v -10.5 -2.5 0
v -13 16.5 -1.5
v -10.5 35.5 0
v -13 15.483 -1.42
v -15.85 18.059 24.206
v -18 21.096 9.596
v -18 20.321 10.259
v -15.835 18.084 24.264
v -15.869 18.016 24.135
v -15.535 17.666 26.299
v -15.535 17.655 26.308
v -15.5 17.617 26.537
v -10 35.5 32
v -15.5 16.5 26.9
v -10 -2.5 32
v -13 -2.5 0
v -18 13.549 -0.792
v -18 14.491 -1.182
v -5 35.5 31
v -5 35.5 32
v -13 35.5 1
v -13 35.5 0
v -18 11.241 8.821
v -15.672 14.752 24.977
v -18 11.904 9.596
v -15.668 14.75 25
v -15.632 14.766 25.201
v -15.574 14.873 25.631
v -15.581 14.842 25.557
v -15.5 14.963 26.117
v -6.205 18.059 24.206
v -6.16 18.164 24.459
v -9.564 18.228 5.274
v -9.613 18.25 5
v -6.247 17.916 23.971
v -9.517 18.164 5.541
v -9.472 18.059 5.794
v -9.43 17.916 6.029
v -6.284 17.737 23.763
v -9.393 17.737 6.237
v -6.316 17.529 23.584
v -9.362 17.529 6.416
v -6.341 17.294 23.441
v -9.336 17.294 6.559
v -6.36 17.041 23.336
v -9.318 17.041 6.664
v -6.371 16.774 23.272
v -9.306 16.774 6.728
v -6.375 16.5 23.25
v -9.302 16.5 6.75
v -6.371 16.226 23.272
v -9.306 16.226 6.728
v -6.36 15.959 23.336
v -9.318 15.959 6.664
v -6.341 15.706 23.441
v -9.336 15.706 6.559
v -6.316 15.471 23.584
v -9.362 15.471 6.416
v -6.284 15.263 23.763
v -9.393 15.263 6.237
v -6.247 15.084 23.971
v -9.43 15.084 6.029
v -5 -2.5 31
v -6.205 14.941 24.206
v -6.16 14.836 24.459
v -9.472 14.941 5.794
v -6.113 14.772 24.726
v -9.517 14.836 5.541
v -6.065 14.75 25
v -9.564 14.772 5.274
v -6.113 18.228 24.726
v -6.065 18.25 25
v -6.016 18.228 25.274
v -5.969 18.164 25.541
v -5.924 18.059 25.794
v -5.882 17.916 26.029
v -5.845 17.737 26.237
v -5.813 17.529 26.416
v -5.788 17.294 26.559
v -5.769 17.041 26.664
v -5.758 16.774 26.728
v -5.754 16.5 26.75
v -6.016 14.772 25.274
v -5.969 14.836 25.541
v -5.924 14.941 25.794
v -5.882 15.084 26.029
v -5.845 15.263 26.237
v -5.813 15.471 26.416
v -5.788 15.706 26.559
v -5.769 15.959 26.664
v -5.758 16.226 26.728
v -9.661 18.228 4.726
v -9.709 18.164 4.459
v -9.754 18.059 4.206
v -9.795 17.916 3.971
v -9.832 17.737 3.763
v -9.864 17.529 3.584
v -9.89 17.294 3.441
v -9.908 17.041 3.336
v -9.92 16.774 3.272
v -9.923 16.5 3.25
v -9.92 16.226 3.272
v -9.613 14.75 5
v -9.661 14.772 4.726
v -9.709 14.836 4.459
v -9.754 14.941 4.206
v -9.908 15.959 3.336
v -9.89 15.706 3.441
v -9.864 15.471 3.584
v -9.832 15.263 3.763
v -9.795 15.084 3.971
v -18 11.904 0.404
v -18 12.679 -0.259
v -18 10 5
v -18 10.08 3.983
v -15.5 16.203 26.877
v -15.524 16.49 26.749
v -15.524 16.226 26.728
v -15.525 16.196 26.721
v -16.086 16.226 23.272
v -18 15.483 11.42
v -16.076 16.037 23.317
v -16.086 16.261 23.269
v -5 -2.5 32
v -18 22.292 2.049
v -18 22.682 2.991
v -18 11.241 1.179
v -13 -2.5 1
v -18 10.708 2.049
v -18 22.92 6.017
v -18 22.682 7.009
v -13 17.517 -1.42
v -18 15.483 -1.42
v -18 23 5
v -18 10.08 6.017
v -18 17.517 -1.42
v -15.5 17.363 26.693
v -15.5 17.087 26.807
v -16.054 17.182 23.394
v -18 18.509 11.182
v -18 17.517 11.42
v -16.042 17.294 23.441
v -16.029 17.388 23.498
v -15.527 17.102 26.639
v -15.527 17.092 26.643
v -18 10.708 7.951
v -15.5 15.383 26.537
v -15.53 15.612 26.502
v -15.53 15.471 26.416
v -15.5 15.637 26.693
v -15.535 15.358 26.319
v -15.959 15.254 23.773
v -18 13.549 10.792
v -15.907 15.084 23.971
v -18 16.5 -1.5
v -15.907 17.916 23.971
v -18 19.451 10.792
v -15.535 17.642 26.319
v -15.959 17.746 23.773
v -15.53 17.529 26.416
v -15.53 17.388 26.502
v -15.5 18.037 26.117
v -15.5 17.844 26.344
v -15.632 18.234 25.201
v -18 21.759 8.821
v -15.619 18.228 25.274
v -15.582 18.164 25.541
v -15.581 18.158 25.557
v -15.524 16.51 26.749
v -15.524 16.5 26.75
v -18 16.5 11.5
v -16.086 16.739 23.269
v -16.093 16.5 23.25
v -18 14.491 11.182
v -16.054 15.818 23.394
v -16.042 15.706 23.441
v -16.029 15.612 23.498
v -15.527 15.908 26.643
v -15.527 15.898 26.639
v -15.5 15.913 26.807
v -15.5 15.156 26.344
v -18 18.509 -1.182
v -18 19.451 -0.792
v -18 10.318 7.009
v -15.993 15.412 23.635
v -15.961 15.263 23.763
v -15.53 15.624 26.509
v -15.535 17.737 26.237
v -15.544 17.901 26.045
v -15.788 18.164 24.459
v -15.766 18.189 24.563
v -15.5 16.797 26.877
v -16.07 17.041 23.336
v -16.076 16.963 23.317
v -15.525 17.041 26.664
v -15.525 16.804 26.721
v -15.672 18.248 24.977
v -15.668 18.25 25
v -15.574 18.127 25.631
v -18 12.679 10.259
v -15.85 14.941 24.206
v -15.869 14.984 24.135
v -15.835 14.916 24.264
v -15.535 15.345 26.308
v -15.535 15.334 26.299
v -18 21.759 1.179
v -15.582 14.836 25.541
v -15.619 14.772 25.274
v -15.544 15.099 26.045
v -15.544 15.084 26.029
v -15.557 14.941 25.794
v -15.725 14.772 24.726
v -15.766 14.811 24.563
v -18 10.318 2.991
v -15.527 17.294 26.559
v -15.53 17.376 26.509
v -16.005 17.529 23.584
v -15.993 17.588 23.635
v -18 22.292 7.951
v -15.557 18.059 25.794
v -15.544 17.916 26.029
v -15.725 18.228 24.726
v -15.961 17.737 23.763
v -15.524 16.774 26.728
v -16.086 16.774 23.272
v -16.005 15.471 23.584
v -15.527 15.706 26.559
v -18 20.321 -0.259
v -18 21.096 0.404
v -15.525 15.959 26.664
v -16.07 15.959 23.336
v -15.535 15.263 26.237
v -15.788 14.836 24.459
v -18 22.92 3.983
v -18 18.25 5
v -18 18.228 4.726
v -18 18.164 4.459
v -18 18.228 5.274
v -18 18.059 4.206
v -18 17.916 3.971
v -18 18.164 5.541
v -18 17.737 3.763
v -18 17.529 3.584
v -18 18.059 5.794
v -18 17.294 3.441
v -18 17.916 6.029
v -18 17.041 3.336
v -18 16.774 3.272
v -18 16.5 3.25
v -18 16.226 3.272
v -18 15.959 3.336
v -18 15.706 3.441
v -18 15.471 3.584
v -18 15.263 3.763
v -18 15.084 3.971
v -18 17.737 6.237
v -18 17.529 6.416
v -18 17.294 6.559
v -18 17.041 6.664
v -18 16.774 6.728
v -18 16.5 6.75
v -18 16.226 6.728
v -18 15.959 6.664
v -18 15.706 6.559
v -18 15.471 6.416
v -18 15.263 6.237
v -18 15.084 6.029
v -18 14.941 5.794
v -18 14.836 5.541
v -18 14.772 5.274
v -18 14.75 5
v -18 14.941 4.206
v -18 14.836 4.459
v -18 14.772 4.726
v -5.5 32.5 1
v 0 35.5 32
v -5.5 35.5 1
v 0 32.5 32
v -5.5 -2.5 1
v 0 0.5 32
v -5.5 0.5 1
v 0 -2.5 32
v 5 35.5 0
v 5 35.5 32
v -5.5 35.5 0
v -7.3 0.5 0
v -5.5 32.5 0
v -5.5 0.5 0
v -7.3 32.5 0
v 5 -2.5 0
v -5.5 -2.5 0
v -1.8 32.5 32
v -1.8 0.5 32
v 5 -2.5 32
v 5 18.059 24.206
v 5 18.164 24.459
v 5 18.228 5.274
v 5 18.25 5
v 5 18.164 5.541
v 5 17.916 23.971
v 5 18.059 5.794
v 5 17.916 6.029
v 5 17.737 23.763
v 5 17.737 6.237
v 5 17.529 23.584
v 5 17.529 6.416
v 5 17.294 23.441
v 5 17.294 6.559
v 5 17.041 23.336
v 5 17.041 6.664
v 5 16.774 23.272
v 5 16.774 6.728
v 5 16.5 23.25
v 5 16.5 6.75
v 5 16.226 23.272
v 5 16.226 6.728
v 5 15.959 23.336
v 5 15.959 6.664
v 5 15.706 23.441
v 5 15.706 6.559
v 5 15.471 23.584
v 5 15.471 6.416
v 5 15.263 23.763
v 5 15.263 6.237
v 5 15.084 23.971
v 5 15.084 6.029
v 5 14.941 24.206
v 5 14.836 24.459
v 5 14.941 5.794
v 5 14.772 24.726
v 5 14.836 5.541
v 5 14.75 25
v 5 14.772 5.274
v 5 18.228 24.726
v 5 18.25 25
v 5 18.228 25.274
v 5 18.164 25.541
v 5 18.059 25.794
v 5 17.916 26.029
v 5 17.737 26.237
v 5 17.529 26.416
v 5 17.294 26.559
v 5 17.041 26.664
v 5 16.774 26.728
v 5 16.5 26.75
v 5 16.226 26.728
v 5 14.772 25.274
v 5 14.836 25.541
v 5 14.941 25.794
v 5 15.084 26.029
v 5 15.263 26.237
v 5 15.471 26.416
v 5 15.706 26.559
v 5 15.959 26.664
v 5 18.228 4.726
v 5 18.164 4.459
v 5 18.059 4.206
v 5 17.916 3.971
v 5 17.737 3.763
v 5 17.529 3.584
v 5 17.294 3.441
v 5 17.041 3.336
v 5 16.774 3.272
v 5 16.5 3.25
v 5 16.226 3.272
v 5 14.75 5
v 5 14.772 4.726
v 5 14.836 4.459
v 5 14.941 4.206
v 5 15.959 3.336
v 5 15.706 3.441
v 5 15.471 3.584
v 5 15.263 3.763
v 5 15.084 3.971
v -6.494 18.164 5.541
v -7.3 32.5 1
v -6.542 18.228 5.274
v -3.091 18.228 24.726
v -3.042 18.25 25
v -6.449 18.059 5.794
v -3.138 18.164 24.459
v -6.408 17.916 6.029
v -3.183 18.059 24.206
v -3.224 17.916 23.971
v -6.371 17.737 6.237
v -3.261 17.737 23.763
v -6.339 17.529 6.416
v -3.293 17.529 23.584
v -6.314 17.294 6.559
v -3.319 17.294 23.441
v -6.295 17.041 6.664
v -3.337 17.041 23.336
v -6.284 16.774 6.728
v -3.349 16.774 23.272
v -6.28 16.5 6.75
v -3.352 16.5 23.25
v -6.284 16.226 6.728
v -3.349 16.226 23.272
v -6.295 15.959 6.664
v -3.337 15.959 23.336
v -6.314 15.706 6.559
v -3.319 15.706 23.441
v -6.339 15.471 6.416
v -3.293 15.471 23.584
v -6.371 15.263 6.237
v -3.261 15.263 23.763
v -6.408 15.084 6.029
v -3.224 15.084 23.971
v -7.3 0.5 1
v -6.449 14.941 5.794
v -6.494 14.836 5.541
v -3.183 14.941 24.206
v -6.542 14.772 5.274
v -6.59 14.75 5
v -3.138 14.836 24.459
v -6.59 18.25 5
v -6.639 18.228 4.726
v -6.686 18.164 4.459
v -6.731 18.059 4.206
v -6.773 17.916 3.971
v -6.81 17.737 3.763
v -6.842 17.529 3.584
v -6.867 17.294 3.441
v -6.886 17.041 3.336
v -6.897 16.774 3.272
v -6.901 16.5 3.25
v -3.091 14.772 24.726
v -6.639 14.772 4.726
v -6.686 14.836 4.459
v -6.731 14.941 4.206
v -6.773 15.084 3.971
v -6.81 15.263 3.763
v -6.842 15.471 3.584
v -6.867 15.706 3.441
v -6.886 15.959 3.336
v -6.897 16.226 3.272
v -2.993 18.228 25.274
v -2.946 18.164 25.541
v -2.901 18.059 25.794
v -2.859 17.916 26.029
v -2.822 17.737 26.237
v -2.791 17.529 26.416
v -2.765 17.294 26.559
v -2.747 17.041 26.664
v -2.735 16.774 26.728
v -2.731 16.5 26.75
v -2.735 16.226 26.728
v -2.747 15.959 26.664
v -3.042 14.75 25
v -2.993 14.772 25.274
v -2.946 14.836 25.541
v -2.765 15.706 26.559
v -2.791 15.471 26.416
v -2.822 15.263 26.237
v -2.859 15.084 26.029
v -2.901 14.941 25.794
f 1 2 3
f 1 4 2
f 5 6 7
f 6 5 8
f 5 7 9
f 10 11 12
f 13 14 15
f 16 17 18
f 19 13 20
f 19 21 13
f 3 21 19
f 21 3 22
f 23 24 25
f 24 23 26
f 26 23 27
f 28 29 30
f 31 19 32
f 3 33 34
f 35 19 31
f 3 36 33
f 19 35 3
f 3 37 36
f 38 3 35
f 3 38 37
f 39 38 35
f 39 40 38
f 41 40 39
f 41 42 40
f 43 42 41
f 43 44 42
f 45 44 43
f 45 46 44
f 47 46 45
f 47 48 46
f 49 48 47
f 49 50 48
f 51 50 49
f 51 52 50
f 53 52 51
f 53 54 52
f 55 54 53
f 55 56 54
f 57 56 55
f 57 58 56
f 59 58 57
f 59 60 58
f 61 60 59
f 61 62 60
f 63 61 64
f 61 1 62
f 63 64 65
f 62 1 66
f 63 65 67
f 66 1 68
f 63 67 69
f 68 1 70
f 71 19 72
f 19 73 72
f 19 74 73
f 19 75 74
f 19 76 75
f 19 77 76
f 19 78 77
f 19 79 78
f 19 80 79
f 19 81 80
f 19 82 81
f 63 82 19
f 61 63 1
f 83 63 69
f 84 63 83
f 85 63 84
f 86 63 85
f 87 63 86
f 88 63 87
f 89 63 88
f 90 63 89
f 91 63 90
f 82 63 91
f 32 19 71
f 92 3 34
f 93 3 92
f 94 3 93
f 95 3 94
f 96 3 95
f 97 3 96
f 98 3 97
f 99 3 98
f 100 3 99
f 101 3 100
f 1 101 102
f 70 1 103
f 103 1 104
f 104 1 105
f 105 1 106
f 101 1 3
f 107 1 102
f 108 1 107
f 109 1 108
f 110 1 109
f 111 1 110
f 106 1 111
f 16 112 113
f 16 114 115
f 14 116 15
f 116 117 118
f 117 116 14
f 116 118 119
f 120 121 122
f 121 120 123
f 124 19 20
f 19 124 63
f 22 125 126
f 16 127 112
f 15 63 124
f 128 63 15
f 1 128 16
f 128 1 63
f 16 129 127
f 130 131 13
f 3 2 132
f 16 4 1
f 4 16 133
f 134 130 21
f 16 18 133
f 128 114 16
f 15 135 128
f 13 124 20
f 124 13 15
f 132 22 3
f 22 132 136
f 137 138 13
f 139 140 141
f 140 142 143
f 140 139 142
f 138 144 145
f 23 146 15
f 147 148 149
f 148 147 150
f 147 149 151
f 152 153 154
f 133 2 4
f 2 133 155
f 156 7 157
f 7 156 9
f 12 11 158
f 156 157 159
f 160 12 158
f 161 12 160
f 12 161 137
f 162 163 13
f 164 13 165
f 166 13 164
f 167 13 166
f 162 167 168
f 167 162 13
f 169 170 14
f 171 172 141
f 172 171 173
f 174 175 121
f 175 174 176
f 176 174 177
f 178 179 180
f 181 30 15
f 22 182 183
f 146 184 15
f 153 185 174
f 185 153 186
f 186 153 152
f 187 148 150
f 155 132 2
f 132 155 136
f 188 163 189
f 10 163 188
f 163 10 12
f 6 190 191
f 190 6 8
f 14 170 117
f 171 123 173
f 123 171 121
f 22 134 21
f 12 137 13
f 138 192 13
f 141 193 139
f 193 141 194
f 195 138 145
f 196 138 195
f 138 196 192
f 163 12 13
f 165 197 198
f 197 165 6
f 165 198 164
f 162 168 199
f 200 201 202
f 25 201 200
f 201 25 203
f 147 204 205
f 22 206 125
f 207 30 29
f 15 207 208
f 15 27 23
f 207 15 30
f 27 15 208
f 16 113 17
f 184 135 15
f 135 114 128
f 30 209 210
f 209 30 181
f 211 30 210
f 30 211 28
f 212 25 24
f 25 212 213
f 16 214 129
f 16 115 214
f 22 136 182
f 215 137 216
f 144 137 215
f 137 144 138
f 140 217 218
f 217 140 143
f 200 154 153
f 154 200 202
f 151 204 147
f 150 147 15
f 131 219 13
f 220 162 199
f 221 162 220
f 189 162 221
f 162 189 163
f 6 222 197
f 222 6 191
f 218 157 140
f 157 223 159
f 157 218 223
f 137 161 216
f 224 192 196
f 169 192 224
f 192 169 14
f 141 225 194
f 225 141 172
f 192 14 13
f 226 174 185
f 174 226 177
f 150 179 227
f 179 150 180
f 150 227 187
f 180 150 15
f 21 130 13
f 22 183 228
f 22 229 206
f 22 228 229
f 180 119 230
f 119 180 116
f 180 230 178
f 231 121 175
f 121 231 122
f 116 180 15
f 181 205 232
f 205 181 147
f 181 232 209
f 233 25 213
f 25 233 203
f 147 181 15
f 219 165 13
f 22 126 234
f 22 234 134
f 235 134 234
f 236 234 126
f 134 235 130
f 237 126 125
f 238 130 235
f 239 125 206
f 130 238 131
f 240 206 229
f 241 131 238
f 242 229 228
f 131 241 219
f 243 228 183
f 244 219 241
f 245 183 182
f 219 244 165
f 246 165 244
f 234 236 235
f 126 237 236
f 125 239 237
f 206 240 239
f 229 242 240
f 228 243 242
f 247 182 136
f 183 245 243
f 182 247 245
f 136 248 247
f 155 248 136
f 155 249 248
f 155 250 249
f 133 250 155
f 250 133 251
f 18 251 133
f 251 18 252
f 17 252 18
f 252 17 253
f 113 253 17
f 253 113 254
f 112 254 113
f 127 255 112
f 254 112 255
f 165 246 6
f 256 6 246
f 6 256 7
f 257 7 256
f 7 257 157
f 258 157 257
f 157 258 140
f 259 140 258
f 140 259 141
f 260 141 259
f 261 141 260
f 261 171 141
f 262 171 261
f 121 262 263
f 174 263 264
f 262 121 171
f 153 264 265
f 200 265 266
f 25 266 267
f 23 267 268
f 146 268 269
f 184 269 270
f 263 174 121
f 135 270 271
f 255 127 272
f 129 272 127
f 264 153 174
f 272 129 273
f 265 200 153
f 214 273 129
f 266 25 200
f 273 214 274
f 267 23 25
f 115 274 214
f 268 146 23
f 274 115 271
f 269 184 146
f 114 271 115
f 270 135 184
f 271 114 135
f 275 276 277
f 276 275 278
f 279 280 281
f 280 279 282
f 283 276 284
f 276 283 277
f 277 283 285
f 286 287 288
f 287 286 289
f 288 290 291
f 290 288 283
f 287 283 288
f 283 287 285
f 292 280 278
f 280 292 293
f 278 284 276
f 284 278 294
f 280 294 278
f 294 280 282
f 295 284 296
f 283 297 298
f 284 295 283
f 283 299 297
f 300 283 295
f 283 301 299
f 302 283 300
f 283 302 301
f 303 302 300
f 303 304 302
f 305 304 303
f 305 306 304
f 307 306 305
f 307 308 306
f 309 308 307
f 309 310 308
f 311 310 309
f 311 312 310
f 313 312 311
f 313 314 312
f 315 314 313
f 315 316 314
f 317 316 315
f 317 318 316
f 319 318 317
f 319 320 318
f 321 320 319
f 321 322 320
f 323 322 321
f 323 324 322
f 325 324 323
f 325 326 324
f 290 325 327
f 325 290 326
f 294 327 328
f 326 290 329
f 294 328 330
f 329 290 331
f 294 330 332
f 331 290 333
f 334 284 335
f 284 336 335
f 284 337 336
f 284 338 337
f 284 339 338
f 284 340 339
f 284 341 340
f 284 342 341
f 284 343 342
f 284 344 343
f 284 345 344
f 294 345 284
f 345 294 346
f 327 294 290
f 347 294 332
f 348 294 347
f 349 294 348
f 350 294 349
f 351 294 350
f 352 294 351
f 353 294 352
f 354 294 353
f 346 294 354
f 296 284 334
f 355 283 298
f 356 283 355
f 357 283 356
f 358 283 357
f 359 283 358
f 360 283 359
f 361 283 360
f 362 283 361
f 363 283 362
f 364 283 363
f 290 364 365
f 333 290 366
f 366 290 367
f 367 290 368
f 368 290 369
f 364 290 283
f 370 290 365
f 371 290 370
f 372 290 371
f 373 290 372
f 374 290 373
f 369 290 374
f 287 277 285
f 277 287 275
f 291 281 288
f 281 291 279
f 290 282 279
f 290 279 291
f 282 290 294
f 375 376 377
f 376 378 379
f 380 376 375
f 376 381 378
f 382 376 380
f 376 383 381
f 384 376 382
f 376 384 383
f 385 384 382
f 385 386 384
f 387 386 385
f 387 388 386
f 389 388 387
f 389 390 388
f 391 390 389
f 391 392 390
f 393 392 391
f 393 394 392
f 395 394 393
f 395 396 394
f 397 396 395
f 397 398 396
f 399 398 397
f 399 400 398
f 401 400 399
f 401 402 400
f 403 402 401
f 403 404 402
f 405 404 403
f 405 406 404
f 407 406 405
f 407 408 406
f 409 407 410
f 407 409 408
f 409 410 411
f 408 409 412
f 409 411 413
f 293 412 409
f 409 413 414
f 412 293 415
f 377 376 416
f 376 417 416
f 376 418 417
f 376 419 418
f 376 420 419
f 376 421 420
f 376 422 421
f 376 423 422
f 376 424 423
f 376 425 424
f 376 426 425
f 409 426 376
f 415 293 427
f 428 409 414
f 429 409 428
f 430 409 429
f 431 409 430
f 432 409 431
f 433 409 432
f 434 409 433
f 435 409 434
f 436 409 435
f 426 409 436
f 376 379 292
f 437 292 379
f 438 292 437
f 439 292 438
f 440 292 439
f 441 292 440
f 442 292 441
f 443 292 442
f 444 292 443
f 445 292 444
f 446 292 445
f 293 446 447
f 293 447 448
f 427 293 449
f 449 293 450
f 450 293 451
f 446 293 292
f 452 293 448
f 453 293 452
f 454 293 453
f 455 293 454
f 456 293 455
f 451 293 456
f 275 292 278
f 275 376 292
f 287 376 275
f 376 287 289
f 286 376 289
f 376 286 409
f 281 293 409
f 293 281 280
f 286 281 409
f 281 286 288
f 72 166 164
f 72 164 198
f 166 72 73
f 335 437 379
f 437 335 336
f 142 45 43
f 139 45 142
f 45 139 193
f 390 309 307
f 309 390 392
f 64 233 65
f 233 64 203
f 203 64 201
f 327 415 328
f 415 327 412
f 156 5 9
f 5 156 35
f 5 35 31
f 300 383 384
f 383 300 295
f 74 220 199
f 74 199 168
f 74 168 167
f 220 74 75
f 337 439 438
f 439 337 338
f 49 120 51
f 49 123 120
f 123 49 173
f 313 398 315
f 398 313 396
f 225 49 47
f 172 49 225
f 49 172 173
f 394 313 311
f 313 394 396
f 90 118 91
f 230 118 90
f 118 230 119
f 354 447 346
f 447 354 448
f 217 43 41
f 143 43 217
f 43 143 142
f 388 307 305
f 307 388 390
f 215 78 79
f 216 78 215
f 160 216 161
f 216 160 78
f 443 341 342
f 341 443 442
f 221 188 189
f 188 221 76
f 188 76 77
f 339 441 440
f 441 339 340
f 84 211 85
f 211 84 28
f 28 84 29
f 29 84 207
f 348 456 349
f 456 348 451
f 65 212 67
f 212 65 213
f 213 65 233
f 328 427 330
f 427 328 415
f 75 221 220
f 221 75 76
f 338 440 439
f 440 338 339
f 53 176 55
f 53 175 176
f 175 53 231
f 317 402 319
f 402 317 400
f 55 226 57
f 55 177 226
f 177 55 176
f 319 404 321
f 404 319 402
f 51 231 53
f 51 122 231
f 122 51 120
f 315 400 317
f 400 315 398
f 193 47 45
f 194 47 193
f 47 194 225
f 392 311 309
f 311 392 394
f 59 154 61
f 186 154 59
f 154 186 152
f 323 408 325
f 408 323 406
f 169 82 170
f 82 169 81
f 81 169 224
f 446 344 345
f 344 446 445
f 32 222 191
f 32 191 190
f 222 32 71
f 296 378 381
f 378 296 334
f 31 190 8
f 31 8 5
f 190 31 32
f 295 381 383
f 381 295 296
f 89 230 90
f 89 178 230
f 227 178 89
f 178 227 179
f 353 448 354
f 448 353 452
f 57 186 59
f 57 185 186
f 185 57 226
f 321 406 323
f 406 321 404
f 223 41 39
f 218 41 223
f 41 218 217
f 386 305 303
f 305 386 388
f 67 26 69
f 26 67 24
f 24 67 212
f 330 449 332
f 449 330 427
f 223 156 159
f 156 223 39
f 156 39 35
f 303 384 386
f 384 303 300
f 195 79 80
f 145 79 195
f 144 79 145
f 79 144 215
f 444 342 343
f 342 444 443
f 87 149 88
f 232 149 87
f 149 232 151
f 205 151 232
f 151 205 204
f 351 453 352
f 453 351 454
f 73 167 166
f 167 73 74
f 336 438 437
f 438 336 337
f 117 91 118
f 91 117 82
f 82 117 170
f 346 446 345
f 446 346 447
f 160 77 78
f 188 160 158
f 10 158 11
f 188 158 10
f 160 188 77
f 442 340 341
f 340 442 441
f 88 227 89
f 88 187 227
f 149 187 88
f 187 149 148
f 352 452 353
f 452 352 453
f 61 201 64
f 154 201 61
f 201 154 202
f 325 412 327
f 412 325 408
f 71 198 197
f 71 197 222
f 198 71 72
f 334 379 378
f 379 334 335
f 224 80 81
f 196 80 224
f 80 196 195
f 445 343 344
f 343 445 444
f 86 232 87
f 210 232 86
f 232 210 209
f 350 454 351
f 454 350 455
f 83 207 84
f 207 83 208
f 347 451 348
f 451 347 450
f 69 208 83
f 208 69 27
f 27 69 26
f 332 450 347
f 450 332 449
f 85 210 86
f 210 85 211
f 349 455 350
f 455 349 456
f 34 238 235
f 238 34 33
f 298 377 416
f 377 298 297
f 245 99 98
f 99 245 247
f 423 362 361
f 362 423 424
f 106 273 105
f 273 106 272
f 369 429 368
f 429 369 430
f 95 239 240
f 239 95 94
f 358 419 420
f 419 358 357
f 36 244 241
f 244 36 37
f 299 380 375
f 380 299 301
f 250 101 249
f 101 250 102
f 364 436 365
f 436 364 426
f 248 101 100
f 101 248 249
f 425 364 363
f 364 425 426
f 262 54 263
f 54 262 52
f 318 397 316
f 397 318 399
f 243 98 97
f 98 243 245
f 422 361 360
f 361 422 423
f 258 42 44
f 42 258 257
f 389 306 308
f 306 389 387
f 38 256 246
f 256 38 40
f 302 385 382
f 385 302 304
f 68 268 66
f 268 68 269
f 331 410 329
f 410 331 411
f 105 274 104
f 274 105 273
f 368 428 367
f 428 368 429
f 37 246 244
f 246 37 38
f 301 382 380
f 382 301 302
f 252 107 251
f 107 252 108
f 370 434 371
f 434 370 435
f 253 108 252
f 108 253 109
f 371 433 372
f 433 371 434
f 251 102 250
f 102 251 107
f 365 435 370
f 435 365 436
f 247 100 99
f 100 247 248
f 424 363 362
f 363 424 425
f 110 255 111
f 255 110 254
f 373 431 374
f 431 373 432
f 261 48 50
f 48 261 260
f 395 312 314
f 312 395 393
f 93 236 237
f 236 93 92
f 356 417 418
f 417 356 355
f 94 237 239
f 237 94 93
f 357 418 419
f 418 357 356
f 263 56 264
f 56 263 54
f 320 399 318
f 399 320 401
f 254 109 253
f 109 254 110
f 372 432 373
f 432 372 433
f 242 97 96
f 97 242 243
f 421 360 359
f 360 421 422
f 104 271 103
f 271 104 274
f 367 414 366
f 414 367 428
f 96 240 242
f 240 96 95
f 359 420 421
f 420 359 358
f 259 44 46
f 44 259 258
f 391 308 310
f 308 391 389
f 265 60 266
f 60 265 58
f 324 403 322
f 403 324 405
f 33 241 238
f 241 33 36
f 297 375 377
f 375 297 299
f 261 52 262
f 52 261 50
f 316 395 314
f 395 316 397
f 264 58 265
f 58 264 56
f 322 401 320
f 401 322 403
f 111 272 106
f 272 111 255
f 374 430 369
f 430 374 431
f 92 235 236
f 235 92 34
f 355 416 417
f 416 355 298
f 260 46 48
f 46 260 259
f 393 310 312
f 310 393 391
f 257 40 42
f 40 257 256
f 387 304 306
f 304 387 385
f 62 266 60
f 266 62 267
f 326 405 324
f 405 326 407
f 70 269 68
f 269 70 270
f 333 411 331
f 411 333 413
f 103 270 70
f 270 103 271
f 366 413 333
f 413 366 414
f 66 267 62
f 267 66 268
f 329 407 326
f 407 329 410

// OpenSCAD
a=5.5;
w=2.5;
s=1.8;
L=9/2-1.5-0.5;

y=8;
difference(){
    union(){
      translate([-5,0,0])  hull(){
            translate([-a-w,-w,0])cube([w,33+2*w,1]);
            translate([0-2*w,0-w,31])cube([2*w,33+2*w,1]);
          
            translate([-8,33/2,33-y]) rotate([0,90,0]) cylinder(h=5,r=1.9, center=true, $fn=40);
           translate([-5-a,33/2,5]) rotate([0,90,0]) cylinder(h=5,r=6.5, center=true, $fn=40);
        }
        
        translate([w,0,0]) hull(){
            translate([-a-w,-w,0])cube([1,33+2*w,1]);
            translate([0-w,0-w,31])cube([1,33+2*w,1]);
        
            translate([0,-w,0])cube([L,33+2*w,32]);
        }       
        
        
        hull(){
            translate([-a-s,0.5,0])cube([1,32,1]);
            translate([0-s,0.5,31])cube([1,32,1]);
            
            translate([0,0.5,0])cube([L,32,32]);
        }
    }
    
    translate([0,33/2,33-y]) rotate([0,90,0]) cylinder(h=100,r=1.75, center=true, $fn=40);
    translate([0,33/2,5]) rotate([0,90,0]) cylinder(h=100,r=1.75, center=true, $fn=40);
    
    //translate([-a-w*3,33/2,33-y]) rotate([0,90,0]) cylinder(h=5,r1=5.5, r2=1.75, center=true, $fn=40);
}
